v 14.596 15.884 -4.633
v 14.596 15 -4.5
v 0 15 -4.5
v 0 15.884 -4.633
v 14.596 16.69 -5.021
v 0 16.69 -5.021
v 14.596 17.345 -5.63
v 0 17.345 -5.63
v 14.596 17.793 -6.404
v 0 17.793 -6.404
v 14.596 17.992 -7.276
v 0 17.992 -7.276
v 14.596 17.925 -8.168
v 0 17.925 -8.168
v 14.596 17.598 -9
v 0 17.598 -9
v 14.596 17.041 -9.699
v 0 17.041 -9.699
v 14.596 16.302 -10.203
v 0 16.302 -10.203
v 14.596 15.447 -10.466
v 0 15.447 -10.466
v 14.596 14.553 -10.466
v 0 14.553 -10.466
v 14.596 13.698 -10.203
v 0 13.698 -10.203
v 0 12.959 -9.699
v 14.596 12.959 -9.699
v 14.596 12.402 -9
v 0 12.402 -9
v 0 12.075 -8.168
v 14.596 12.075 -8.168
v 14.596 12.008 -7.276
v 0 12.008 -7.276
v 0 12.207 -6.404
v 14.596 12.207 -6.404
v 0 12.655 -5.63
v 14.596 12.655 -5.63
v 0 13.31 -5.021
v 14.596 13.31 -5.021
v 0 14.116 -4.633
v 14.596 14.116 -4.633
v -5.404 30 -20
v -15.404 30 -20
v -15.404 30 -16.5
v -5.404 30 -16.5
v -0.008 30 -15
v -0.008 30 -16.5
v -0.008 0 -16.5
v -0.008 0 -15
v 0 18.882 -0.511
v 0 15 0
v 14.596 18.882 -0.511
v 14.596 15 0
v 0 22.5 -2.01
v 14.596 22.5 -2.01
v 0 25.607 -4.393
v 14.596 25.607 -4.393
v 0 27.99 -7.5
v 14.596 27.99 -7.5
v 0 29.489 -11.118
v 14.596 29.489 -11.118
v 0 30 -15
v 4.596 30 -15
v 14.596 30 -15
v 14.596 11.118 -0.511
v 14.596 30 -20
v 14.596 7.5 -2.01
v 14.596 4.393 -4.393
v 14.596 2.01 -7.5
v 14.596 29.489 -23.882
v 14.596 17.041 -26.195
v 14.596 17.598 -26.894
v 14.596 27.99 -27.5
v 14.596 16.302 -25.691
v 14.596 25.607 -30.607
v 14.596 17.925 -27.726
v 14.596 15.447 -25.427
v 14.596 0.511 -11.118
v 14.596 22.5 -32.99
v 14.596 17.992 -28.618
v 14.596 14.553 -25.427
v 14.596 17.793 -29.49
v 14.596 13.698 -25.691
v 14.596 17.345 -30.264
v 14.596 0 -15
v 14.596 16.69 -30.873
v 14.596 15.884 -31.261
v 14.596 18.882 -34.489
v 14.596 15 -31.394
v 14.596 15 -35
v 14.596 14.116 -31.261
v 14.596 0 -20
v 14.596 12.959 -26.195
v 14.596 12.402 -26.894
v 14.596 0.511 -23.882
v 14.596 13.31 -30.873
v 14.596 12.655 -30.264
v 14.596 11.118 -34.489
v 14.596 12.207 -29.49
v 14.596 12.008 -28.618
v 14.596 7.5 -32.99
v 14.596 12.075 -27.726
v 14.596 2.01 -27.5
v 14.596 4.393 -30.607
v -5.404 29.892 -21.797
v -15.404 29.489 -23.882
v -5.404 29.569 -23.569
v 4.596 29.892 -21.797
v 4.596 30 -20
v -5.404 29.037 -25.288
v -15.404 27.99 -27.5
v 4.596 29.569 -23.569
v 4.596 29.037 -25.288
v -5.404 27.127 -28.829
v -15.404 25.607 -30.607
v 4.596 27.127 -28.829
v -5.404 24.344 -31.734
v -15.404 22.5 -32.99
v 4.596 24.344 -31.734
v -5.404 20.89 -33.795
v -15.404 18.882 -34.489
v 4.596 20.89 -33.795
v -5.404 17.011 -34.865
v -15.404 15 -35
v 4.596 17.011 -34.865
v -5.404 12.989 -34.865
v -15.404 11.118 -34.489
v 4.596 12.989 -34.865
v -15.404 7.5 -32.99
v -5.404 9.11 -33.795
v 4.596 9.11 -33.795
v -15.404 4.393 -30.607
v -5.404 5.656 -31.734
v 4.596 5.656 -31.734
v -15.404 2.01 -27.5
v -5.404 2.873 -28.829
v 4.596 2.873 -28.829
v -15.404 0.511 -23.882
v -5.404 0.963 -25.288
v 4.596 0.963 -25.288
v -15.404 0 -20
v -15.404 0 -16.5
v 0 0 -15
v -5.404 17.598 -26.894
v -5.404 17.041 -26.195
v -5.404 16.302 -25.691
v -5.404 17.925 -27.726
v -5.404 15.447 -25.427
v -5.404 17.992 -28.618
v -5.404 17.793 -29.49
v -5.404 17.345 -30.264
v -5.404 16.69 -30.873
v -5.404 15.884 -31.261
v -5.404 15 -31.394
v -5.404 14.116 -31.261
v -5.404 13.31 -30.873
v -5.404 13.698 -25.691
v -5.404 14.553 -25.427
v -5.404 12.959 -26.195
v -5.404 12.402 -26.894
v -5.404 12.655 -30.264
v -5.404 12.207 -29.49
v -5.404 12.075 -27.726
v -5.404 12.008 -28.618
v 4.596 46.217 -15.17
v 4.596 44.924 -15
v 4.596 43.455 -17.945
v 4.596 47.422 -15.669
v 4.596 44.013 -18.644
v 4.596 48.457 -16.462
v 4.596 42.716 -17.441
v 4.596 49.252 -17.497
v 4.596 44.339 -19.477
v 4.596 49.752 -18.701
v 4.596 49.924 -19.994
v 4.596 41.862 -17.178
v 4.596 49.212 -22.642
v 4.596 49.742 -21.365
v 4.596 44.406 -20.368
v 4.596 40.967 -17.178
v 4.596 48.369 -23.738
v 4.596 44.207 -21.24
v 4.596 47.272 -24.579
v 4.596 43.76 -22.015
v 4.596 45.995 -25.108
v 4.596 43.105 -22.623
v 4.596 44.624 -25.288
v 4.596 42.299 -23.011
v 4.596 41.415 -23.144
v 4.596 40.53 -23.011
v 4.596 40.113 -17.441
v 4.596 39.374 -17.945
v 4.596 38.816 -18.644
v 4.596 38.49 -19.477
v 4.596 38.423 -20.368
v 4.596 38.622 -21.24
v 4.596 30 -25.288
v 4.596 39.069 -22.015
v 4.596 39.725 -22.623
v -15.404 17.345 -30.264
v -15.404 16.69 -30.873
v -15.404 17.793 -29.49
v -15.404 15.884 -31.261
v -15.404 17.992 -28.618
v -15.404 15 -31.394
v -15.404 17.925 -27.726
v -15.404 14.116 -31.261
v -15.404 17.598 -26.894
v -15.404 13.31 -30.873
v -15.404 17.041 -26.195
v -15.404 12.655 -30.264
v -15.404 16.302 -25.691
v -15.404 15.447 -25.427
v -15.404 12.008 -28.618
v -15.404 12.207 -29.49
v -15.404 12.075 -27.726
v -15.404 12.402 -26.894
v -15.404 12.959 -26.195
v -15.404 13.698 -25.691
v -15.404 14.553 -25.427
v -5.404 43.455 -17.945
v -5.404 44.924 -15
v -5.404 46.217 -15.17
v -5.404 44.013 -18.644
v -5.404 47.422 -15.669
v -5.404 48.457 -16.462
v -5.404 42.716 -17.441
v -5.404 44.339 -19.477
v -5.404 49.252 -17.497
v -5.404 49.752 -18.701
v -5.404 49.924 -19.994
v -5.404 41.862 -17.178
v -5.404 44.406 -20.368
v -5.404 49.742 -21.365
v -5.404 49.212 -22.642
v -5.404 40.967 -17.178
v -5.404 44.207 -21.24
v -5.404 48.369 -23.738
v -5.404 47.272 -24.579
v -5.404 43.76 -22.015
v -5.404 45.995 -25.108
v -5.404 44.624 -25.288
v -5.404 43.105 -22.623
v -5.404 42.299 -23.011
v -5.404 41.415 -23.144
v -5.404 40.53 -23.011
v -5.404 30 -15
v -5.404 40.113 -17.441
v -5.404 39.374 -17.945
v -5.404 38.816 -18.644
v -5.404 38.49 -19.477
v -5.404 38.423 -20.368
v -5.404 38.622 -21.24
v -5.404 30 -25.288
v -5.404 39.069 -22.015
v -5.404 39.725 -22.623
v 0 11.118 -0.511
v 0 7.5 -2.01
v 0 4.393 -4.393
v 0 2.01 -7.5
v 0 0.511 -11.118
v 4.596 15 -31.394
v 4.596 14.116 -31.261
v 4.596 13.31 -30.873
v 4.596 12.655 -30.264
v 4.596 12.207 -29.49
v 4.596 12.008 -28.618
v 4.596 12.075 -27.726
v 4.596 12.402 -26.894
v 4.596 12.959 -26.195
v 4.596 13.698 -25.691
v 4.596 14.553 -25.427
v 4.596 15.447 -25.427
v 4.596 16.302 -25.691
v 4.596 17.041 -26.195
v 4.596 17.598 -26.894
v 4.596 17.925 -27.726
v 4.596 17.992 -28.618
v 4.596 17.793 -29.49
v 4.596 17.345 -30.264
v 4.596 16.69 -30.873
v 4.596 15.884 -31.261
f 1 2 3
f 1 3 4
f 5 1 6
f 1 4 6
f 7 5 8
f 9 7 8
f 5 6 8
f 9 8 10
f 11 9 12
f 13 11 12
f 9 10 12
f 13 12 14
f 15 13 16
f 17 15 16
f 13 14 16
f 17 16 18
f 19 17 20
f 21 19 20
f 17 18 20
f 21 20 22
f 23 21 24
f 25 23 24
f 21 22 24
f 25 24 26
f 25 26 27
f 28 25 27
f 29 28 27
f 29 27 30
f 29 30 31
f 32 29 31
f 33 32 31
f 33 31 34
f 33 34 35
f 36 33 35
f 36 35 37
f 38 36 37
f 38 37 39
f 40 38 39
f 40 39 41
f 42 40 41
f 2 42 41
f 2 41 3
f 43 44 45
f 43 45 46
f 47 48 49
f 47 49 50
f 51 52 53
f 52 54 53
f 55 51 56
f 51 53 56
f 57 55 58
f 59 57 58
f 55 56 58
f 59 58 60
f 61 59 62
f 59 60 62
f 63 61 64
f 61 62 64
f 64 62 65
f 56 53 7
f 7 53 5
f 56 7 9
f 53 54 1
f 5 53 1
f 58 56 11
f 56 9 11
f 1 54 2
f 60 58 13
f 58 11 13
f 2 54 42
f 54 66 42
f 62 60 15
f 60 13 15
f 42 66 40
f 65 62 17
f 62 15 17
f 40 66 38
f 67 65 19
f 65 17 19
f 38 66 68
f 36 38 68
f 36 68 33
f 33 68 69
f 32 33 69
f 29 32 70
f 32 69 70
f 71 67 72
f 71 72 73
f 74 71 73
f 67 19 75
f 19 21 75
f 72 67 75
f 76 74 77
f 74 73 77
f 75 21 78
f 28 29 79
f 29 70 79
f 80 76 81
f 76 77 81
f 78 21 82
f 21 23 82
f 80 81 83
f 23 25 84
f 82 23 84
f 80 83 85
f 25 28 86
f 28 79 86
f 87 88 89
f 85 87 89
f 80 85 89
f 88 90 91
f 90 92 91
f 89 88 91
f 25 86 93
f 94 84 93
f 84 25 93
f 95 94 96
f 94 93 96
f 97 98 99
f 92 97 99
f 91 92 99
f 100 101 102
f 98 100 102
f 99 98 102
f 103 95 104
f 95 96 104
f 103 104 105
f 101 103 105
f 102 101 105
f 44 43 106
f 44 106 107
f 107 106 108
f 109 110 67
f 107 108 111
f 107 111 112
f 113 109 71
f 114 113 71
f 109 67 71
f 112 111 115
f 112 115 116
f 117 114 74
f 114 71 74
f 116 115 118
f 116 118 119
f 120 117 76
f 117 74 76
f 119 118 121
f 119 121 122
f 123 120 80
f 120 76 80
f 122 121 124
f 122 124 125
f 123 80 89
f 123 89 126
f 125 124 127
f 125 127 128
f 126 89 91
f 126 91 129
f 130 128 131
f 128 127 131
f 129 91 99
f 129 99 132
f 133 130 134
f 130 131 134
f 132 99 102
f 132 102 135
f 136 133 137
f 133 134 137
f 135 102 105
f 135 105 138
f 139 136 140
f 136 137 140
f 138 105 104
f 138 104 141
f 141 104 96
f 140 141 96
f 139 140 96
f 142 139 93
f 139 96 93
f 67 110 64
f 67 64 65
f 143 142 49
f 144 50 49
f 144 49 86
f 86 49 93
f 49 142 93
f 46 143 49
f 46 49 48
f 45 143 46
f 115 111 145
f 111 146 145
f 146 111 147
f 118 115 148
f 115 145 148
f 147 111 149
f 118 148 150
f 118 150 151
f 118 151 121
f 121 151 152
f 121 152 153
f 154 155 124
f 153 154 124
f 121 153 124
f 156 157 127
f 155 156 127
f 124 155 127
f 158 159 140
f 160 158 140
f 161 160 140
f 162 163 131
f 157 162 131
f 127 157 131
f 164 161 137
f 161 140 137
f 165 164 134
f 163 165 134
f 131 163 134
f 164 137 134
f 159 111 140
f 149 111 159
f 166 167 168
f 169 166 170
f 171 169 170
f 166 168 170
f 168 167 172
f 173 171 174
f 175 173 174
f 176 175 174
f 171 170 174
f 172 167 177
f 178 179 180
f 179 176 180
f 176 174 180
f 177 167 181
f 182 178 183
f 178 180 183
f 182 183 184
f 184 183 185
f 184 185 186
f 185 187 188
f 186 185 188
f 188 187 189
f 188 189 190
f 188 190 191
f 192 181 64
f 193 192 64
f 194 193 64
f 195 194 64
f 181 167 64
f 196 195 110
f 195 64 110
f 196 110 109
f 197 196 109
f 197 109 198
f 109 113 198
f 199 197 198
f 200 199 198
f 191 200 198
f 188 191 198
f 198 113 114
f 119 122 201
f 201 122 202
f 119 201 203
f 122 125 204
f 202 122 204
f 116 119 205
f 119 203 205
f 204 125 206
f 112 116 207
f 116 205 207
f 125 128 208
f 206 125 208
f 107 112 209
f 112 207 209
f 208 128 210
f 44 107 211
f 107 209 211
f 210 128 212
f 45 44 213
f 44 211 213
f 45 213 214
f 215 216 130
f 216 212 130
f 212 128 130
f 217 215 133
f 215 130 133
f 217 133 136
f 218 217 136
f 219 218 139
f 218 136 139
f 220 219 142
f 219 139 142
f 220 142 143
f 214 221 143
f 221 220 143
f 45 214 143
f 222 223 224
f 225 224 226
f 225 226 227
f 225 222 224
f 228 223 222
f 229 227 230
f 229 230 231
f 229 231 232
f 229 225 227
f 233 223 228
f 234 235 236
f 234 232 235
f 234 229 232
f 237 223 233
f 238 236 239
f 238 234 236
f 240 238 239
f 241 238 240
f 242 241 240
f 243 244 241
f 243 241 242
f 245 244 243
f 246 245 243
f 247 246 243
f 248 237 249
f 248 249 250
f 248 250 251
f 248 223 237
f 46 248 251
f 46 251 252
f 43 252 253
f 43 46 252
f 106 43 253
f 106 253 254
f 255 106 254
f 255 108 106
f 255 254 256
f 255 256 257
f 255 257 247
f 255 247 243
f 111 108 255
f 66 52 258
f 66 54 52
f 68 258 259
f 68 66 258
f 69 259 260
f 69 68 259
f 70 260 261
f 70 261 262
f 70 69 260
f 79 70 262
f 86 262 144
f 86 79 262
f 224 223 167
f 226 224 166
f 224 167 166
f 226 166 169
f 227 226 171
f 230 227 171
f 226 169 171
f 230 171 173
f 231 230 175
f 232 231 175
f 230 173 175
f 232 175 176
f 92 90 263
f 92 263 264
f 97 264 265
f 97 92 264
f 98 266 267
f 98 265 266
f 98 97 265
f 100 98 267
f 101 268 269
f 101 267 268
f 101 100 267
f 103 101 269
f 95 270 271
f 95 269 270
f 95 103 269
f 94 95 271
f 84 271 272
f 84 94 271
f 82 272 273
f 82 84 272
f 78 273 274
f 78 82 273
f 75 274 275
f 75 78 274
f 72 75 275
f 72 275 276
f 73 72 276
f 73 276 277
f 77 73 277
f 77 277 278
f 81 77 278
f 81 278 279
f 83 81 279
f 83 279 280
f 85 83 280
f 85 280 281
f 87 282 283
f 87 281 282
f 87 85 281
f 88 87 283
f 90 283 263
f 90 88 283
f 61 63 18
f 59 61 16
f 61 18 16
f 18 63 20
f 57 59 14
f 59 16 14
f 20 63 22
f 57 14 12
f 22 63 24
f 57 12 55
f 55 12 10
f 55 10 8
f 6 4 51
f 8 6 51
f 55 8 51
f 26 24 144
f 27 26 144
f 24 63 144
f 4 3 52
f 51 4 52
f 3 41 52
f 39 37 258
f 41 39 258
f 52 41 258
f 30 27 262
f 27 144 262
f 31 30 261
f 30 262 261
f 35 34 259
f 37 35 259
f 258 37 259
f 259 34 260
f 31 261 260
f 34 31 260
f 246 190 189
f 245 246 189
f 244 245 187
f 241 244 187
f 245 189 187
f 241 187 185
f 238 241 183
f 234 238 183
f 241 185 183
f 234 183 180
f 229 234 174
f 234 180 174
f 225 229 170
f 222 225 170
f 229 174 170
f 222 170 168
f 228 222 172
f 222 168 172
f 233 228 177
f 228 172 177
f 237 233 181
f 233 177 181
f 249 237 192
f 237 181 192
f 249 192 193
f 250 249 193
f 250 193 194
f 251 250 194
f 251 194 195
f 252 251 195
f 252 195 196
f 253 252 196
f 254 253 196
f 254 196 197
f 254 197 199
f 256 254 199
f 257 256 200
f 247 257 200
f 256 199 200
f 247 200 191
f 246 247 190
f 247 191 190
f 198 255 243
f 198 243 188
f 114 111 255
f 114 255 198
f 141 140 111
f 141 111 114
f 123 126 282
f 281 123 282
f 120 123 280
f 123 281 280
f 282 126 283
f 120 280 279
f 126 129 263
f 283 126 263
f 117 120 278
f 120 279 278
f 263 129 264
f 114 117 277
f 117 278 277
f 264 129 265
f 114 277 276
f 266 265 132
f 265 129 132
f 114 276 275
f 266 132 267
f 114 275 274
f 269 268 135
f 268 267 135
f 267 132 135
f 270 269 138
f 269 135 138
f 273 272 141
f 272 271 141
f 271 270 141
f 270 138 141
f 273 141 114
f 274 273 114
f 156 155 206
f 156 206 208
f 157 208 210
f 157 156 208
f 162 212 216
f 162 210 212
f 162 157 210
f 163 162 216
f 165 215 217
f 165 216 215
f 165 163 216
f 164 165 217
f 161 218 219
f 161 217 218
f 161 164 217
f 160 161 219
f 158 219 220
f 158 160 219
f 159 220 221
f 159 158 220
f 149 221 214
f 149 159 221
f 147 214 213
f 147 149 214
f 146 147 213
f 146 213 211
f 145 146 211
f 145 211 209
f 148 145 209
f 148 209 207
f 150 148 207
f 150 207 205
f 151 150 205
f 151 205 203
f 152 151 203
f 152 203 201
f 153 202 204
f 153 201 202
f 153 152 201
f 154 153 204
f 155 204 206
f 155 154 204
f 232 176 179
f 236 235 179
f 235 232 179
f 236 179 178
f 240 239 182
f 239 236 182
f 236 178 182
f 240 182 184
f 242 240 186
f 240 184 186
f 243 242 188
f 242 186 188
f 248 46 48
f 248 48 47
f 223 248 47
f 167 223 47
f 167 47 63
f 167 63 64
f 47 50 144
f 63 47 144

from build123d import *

# Parameters (mm, degrees)
BOSS_EXTRUDE2_DEPTH     = 30
SKETCH3_R               = 3
CUT_EXTRUDE1_DEPTH      = 30
FILLET7_R               = 15
FILLET8_R               = 15
CUT_EXTRUDE2_DEPTH      = 30
CUT_EXTRUDE2_DEPTH_BACK = 30
SKETCH6_R               = 3
SKETCH7_W               = 10
SKETCH7_H               = 10.288497565
BOSS_EXTRUDE3_DEPTH     = 19.923787886
SKETCH8_R               = 3
CUT_EXTRUDE3_DEPTH      = 10
FILLET12_R              = 5
FILLET15_R              = 5.3
FILLET17_R              = 15
SKETCH9_W               = 1.5
SKETCH9_H               = 30
CUT_EXTRUDE4_DEPTH      = 15.39622199


# Some blends are built 0.0001 mm under size
with BuildPart() as part:
    # Sketch2 → Boss-Extrude2 (new body)
    with BuildSketch(Plane(origin=(0, 0, 0), x_dir=(1, 0, 0), z_dir=(0, 1, 0))):
        Polygon((0, 0), (14.595501533, 0), (14.595501533, 35), (4.595501533, 35), (4.595501533, 25.288497565), (-5.404498467, 25.288497565), (-5.404498467, 35), (-15.404498467, 35), (-15.404498467, 15), (0, 15), align=None)
    extrude(amount=BOSS_EXTRUDE2_DEPTH)

    # Sketch3 → Cut-Extrude1 (cut)
    with BuildSketch(Plane.ZY):
        with Locations((-7.5, 15)):
            Circle(SKETCH3_R)
    extrude(amount=-CUT_EXTRUDE1_DEPTH, mode=Mode.SUBTRACT)

    # Fillet7
    fillet7_edges = [part.edges().sort_by_distance(p)[0] for p in [
        (7.297750767, 30, 0),
    ]]
    fillet(fillet7_edges, radius=FILLET7_R)

    # Fillet8
    fillet8_edges = [part.edges().sort_by_distance(p)[0] for p in [
        (7.297750767, 0, 0),
    ]]
    fillet(fillet8_edges, radius=FILLET8_R - 0.0001)  # a hair under: the kernel refuses the full size

    # Sketch6 → Cut-Extrude2 (cut, two sides: drawn at the far end of the back side and taken through both)
    with BuildSketch(Plane.ZY.offset(-4.595501533).offset(-CUT_EXTRUDE2_DEPTH_BACK)):
        with Locations(Location((-28.393945452, 15, 0), (0, 0, 180))):
            Circle(SKETCH6_R)
    extrude(amount=CUT_EXTRUDE2_DEPTH + CUT_EXTRUDE2_DEPTH_BACK, mode=Mode.SUBTRACT)

    # Sketch7 → Boss-Extrude3 (add)
    with BuildSketch(Plane(origin=(0, 30, 0), x_dir=(1, 0, 0), z_dir=(0, 1, 0))):
        with Locations((-0.404498467, 20.144248783)):
            Rectangle(SKETCH7_W, SKETCH7_H)
    extrude(amount=BOSS_EXTRUDE3_DEPTH)

    # Sketch8 → Cut-Extrude3 (cut)
    with BuildSketch(Plane(origin=(4.595501533, 0, 0), x_dir=(0, 0, -1), z_dir=(1, 0, 0))):
        with Locations((20.144248782, 41.414541631)):
            Circle(SKETCH8_R)
    extrude(amount=-CUT_EXTRUDE3_DEPTH, mode=Mode.SUBTRACT)

    # Fillet12
    fillet12_edges = [part.edges().sort_by_distance(p)[0] for p in [
        (-0.404498467, 49.923787886, -15),
    ]]
    fillet(fillet12_edges, radius=FILLET12_R)

    # Fillet15
    # the kernel refuses this fillet: 5.3 mm, written as the material it takes off along each edge
    with BuildSketch(Plane(origin=(17.845501533, 49.923787886, -25.288497565), x_dir=(0, 0, 1), z_dir=(-1, 0, 0))) as fillet15_piece_1:
        with BuildLine():
            CenterArc((FILLET15_R, -FILLET15_R), FILLET15_R, 90, 90)
            Line((0, -FILLET15_R), (-FILLET15_R * 0.02, -FILLET15_R))
            Line((-FILLET15_R * 0.02, -FILLET15_R), (-FILLET15_R * 0.02, FILLET15_R * 0.02))
            Line((-FILLET15_R * 0.02, FILLET15_R * 0.02), (FILLET15_R, FILLET15_R * 0.02))
            Line((FILLET15_R, FILLET15_R * 0.02), (FILLET15_R, 0))
        make_face()
    extrude(amount=36.5, mode=Mode.SUBTRACT)

    # Fillet17
    # the kernel refuses this fillet: 15 mm, written as the material it takes off along each edge
    with BuildSketch(Plane(origin=(52.095501533, 30, -35), x_dir=(0, 0, 1), z_dir=(-1, 0, 0)), Plane(origin=(-5.404498467, 30, -35), x_dir=(0, 0, 1), z_dir=(-1, 0, 0))) as fillet17_piece_1:
        with BuildLine():
            CenterArc((FILLET17_R, -FILLET17_R), FILLET17_R, 90, 90)
            Line((0, -FILLET17_R), (0, 0))
            Line((0, 0), (FILLET17_R, 0))
        make_face()
    extrude(amount=47.5, mode=Mode.SUBTRACT)
    with BuildSketch(Plane(origin=(52.095501533, 30, -35), x_dir=(0, 0, 1), z_dir=(-1, 0, 0))) as fillet17_piece_2_section:
        with BuildLine():
            CenterArc((FILLET17_R, -FILLET17_R), FILLET17_R, 90, 90)
            Line((0, -FILLET17_R), (0, 0))
            Line((0, 0), (FILLET17_R, 0))
        make_face()
    fillet17_piece_2 = extrude(amount=85, mode=Mode.PRIVATE)
    fillet17_piece_2 = split(fillet17_piece_2, bisect_by=Plane(origin=(-5.404498467, 29.712703536, -23.975011992), z_dir=(-1, 0, 0)), keep=Keep.TOP, mode=Mode.PRIVATE)
    add(fillet17_piece_2, mode=Mode.SUBTRACT)
    with BuildSketch(Plane(origin=(32.095501533, 0, -35), x_dir=(0, 0, 1), z_dir=(-1, 0, 0))) as fillet17_piece_3:
        with BuildLine():
            CenterArc((FILLET17_R, FILLET17_R), FILLET17_R, 180, 90)
            Line((0, FILLET17_R), (0, 0))
            Line((0, 0), (FILLET17_R, 0))
        make_face()
    extrude(amount=85, mode=Mode.SUBTRACT)
    with BuildSketch(Plane(origin=(32.095501533, 30, -35), x_dir=(0, 0, 1), z_dir=(-1, 0, 0))) as fillet17_piece_4_section:
        with BuildLine():
            CenterArc((FILLET17_R, -FILLET17_R), FILLET17_R, 90, 90)
            Line((0, -FILLET17_R), (0, 0))
            Line((0, 0), (FILLET17_R, 0))
        make_face()
    fillet17_piece_4 = extrude(amount=85, mode=Mode.PRIVATE)
    fillet17_piece_4 = split(fillet17_piece_4, bisect_by=Plane(origin=(4.595501533, 29.712703536, -23.975011992), z_dir=(1, 0, 0)), keep=Keep.TOP, mode=Mode.PRIVATE)
    add(fillet17_piece_4, mode=Mode.SUBTRACT)

    # Sketch9 → Cut-Extrude4 (cut)
    with BuildSketch(Plane.ZY.offset(15.404498467)):
        with Locations((-15.75, 15)):
            Rectangle(SKETCH9_W, SKETCH9_H)
    extrude(amount=-CUT_EXTRUDE4_DEPTH, mode=Mode.SUBTRACT)


solid = part.part
